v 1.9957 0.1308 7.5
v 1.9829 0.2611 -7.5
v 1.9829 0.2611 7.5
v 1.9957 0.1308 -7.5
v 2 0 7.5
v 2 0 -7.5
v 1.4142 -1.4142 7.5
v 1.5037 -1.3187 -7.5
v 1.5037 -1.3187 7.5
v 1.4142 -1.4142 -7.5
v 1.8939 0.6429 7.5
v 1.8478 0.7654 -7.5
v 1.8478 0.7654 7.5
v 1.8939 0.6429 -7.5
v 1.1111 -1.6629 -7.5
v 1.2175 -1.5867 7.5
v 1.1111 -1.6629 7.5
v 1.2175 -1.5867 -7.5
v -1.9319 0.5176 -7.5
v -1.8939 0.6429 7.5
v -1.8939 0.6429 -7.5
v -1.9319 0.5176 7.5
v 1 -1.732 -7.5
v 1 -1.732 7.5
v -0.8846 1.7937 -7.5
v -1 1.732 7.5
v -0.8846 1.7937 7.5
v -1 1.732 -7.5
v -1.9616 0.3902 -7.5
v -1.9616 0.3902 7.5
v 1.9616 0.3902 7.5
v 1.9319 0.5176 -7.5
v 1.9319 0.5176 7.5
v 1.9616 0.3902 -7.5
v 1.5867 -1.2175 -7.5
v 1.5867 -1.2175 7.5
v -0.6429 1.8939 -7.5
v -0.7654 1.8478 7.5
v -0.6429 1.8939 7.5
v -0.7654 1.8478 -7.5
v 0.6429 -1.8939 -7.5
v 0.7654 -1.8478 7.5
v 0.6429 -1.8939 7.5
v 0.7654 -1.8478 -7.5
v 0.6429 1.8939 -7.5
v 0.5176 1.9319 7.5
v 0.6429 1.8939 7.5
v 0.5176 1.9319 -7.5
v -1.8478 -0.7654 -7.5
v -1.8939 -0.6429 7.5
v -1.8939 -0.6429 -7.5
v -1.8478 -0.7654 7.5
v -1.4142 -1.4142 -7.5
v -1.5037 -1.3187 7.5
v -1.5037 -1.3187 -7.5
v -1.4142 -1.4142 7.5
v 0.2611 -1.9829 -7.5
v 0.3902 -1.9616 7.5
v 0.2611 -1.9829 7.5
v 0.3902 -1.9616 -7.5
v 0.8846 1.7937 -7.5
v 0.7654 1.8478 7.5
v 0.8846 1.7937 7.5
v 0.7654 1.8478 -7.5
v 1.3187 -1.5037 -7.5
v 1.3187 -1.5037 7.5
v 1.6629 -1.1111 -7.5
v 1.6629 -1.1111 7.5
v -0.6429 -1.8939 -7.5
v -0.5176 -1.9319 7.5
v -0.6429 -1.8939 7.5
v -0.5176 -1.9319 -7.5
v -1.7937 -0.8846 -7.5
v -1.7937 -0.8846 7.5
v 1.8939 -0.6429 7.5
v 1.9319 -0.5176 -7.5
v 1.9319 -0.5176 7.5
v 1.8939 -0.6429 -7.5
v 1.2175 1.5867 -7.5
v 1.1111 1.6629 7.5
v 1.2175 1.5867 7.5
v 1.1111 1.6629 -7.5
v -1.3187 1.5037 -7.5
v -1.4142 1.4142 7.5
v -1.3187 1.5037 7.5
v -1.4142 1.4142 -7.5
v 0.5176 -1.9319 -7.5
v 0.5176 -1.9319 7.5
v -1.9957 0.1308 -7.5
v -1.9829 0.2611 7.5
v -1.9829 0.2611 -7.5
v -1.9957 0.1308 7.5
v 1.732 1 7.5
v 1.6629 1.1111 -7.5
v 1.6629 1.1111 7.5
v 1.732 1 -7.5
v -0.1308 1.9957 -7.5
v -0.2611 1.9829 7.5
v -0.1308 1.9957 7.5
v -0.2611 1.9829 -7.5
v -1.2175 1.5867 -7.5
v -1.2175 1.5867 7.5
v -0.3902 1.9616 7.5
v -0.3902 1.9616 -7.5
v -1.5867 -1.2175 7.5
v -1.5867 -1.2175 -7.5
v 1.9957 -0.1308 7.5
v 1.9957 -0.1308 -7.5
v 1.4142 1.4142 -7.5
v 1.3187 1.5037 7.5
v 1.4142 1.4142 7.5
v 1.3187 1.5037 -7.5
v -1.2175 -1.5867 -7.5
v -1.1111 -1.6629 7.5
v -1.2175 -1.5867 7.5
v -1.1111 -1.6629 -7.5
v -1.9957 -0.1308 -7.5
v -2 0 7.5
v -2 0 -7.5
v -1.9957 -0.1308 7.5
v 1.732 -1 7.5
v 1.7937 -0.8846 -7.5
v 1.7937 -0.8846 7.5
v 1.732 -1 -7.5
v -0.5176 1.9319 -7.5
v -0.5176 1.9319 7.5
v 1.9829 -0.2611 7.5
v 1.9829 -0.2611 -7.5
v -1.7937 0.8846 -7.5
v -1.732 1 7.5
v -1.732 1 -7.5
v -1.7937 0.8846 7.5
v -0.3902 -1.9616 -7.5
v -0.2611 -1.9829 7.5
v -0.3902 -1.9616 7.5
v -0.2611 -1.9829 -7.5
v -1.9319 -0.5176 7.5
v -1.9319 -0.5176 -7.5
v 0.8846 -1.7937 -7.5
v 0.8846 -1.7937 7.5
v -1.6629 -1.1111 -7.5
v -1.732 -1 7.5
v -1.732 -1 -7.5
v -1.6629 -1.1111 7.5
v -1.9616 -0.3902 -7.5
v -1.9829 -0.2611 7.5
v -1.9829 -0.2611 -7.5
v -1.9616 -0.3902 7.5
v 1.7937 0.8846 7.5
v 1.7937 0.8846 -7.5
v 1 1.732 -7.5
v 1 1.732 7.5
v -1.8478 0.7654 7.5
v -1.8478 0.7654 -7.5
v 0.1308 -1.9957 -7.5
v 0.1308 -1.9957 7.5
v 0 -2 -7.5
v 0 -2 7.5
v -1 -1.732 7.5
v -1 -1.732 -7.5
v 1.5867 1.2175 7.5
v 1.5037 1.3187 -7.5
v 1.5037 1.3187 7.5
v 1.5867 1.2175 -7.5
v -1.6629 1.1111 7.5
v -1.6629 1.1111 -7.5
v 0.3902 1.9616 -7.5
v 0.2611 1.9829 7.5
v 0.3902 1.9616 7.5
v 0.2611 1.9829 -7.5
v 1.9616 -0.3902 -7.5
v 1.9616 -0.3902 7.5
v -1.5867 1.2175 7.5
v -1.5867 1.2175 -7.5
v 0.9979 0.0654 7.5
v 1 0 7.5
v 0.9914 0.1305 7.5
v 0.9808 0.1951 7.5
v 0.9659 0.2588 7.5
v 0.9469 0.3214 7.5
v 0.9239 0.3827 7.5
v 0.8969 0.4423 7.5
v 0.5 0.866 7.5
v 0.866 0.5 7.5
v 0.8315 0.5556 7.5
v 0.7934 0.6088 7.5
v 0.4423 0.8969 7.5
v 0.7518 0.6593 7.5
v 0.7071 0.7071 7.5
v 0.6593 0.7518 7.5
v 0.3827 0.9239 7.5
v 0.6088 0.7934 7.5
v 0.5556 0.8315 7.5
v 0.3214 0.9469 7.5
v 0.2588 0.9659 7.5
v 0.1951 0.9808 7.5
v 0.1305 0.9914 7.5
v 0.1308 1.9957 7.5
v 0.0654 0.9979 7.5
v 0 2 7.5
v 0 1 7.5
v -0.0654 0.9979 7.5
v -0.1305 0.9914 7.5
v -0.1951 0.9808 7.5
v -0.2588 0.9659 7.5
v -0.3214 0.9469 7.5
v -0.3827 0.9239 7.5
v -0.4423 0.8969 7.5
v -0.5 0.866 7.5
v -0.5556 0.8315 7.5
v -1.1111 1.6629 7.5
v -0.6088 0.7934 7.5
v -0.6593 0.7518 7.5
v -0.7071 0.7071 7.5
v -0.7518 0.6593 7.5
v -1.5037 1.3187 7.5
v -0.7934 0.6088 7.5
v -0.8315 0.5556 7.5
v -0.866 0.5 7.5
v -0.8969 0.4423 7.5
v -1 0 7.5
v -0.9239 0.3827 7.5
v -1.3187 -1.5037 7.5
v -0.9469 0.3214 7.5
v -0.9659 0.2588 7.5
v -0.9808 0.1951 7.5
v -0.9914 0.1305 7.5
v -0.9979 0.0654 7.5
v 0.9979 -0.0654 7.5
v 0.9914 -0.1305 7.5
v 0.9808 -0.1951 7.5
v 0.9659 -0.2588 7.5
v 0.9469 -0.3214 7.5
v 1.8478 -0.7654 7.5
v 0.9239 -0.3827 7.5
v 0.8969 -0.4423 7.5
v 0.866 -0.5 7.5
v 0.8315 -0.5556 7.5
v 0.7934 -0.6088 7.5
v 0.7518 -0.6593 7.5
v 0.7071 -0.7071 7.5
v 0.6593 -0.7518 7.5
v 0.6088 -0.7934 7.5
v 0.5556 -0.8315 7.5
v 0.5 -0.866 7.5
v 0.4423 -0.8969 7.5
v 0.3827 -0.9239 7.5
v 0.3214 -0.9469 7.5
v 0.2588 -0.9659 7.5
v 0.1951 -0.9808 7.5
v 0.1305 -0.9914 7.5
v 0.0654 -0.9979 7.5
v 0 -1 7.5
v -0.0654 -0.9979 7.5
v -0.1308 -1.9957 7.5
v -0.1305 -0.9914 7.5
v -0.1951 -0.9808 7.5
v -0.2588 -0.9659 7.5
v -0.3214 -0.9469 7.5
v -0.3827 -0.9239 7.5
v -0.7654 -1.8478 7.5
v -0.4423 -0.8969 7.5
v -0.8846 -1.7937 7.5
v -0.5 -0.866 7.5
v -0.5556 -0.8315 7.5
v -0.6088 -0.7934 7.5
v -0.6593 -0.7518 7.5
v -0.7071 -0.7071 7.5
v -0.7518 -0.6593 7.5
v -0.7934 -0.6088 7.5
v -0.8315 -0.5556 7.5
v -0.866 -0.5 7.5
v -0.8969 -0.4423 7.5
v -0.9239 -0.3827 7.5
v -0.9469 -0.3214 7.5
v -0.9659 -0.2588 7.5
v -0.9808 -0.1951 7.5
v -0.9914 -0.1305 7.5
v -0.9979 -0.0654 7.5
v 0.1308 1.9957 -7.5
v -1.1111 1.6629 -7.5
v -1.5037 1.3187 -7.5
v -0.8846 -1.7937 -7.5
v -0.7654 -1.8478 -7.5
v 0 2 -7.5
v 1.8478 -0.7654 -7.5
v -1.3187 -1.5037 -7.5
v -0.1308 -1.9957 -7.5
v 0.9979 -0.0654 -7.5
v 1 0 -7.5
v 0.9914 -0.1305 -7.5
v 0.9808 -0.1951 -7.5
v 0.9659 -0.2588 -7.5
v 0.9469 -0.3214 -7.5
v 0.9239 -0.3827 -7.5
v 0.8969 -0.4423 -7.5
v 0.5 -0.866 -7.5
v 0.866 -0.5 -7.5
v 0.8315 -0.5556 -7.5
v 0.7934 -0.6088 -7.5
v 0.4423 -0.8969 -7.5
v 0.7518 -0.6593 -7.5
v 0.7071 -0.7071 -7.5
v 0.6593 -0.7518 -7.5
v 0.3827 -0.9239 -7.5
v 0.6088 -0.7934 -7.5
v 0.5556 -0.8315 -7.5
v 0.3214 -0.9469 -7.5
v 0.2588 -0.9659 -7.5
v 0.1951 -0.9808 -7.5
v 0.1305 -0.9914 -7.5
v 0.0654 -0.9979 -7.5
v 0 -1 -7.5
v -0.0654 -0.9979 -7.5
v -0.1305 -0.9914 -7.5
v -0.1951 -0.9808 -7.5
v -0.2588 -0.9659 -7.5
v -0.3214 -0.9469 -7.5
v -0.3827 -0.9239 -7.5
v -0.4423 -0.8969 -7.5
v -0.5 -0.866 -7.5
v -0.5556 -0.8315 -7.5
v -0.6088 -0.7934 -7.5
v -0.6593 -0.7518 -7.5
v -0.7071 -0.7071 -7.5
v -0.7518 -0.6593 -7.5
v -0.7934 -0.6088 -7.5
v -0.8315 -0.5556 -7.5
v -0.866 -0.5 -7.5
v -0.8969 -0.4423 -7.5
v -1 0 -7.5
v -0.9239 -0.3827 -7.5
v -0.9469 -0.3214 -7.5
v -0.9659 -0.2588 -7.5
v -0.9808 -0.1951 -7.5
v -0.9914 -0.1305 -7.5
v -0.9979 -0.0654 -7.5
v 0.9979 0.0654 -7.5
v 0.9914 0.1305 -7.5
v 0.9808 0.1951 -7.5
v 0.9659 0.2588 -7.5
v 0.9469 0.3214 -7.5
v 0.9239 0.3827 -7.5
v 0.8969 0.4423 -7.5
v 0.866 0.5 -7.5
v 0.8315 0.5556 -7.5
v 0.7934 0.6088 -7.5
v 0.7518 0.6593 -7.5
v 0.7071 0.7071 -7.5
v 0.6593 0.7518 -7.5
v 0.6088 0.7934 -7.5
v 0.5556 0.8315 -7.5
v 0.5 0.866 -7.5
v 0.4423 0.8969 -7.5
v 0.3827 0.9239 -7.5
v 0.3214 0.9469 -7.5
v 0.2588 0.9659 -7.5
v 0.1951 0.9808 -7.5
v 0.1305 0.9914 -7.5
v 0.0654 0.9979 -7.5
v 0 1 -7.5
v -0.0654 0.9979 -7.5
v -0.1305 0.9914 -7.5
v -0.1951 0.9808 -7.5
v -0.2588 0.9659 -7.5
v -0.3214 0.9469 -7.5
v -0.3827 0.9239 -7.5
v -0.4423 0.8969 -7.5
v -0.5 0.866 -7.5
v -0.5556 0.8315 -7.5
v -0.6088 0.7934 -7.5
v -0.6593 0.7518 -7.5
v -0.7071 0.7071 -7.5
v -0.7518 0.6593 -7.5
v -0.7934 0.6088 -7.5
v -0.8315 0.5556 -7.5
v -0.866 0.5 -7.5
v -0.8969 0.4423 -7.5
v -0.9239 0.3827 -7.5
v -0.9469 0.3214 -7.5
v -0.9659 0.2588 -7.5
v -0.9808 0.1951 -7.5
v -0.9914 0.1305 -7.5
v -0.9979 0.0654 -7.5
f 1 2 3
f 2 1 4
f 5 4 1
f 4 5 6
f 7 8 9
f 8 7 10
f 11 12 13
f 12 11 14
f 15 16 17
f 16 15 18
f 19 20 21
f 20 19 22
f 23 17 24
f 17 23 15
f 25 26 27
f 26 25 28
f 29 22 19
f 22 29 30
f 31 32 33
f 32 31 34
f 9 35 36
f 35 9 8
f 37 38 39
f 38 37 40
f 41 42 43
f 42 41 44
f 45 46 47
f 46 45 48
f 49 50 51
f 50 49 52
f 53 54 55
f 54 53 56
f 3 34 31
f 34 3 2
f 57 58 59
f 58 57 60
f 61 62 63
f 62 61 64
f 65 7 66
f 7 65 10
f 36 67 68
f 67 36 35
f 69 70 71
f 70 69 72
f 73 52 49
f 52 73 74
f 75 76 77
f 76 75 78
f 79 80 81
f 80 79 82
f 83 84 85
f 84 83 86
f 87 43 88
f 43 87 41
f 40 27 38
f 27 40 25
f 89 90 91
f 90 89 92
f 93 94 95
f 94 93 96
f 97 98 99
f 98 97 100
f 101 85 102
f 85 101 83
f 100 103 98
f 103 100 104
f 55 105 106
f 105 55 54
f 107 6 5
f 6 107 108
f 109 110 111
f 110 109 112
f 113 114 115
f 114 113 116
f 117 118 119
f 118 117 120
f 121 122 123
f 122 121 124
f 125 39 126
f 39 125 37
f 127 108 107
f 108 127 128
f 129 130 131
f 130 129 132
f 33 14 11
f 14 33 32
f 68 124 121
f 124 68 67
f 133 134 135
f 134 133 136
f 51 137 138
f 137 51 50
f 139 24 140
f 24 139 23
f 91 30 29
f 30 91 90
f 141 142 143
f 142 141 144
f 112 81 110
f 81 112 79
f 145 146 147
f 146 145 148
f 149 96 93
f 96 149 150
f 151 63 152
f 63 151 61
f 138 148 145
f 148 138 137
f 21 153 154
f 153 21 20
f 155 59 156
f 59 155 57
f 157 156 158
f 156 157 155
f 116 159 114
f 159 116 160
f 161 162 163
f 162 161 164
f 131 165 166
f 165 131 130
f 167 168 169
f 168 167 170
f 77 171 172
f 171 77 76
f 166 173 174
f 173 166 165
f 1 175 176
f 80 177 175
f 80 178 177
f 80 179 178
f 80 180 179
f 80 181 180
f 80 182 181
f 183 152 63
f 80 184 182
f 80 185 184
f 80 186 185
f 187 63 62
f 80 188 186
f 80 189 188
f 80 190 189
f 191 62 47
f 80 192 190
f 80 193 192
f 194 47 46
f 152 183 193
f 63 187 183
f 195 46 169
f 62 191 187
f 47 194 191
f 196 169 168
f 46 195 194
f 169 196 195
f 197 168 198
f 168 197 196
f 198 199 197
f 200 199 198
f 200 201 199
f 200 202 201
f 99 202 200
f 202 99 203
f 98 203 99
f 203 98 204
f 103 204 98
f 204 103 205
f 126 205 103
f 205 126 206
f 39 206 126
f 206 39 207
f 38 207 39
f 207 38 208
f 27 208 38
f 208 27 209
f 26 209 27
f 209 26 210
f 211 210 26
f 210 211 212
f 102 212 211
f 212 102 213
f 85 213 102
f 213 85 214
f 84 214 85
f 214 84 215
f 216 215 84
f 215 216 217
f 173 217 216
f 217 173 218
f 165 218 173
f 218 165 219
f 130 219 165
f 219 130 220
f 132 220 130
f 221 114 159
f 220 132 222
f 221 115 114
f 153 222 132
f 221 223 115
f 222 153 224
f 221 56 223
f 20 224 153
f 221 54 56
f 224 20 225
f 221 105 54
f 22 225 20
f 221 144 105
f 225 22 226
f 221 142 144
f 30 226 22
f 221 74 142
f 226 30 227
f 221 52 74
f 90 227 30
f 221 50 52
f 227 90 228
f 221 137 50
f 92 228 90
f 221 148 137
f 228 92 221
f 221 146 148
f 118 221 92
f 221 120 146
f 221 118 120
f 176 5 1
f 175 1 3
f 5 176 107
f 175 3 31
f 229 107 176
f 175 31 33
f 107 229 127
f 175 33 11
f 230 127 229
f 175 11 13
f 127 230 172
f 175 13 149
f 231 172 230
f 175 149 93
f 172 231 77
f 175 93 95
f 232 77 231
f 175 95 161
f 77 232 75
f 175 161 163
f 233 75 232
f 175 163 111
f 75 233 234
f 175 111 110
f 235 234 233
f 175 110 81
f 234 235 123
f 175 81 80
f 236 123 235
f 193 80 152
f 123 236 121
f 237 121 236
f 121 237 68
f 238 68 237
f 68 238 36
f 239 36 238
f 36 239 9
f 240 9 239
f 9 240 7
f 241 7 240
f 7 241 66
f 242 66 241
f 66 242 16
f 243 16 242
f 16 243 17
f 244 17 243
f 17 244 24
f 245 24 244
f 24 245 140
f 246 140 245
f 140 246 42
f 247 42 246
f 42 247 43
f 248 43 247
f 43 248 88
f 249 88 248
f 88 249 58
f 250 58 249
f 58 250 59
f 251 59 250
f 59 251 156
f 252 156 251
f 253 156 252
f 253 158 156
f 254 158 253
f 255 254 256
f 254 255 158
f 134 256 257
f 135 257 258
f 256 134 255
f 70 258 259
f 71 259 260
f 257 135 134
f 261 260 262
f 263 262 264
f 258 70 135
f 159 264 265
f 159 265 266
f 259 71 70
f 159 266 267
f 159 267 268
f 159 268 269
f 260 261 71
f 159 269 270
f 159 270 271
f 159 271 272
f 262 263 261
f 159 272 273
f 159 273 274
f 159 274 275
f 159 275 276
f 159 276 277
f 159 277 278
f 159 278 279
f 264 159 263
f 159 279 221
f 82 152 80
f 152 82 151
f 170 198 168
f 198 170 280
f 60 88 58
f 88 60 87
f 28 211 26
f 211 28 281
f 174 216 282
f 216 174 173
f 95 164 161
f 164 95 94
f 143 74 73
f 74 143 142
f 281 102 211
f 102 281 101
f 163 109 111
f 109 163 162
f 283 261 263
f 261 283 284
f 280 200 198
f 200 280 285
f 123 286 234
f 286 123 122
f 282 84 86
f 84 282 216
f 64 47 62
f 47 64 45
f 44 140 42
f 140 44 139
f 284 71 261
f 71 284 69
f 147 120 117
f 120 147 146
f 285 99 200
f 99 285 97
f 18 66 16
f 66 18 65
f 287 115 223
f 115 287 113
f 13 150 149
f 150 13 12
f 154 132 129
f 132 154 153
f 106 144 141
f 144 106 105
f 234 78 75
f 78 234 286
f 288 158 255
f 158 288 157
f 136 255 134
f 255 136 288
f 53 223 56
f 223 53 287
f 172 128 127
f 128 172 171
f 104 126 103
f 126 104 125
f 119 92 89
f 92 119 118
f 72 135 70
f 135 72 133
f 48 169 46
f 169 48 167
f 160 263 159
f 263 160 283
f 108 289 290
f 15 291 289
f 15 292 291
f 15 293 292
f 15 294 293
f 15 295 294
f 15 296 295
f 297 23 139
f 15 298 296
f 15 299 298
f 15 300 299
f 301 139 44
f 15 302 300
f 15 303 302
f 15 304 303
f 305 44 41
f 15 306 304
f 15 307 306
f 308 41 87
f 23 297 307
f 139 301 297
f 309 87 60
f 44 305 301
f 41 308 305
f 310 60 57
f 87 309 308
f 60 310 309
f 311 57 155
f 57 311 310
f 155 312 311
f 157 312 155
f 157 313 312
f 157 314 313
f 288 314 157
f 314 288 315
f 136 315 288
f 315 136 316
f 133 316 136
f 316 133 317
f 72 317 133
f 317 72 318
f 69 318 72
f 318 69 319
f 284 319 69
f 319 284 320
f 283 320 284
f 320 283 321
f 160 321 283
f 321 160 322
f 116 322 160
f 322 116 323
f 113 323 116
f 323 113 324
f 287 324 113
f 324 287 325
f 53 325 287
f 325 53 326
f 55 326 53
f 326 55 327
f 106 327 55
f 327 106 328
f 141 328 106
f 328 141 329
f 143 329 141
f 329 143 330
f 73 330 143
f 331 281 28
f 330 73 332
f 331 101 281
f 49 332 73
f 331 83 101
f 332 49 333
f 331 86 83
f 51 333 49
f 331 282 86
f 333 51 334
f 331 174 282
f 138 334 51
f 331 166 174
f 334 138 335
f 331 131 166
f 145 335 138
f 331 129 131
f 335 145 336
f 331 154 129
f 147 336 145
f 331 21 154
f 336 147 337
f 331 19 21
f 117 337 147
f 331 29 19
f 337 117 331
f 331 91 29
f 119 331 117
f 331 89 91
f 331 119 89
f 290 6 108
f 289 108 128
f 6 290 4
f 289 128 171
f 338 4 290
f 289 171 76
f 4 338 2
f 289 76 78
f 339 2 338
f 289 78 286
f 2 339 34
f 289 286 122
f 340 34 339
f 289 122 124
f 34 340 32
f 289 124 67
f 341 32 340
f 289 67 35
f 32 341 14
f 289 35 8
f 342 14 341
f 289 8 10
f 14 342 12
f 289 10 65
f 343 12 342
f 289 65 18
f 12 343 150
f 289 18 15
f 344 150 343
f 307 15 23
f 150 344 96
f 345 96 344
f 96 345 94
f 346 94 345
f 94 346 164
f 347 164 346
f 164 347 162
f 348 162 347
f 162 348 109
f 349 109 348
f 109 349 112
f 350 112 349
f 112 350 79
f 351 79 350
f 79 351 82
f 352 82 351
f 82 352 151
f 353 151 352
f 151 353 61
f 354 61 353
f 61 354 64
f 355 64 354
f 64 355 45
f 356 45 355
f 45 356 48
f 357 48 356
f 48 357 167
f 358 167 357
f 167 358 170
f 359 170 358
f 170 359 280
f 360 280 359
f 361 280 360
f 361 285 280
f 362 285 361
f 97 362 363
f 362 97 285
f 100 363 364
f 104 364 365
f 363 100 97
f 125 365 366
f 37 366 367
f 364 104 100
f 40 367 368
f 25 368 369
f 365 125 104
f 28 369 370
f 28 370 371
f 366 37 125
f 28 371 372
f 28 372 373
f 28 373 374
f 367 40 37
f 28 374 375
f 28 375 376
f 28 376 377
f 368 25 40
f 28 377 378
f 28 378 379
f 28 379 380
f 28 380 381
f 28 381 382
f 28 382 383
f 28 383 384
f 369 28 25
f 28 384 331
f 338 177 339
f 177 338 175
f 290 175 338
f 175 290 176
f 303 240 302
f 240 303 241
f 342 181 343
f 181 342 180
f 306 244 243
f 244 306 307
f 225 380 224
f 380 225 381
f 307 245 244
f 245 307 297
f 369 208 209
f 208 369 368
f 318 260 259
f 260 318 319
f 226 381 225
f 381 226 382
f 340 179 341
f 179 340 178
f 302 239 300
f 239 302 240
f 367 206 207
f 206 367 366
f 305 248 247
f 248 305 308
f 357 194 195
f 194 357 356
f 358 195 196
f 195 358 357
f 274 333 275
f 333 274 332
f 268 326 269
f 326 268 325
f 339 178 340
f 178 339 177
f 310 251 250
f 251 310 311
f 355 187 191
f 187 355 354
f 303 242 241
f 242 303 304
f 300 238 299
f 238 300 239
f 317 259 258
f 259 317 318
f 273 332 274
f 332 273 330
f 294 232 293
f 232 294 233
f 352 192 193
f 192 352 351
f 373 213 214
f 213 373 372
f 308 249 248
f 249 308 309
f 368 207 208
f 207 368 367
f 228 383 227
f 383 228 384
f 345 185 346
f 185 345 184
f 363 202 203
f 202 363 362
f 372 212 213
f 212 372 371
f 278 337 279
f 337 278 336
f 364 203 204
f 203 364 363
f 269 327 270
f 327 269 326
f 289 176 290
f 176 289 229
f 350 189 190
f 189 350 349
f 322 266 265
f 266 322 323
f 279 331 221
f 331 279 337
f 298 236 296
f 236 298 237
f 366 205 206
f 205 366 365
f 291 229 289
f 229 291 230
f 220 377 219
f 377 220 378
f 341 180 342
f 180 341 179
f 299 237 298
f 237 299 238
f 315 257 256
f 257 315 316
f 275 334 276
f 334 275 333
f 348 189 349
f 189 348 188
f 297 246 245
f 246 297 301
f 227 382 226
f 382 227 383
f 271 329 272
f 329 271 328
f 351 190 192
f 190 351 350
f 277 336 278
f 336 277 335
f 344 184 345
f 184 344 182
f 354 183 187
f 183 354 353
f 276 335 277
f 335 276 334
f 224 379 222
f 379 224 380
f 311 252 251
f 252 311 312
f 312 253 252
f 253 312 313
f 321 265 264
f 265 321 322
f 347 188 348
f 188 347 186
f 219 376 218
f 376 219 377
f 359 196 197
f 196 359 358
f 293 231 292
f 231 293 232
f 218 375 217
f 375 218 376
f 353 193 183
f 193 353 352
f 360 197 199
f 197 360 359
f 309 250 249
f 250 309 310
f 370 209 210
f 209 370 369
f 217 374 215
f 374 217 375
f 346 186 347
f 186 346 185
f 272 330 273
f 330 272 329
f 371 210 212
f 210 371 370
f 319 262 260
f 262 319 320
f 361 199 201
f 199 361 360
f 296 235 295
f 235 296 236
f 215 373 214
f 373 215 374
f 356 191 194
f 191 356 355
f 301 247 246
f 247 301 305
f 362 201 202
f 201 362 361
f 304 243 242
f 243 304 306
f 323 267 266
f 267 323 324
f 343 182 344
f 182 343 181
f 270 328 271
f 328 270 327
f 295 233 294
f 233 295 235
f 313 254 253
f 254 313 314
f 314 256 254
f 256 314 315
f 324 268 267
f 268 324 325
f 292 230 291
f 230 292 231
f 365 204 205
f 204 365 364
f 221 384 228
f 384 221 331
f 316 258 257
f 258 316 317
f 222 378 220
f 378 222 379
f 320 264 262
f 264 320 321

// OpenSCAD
// Parameters
length = 15; //[7.5:30:0.5]
outer_diameter = 4; //[2:8:0.1]
inner_diameter = 2; //[1:6:0.1]
center = 1; //[0:1:1]
eps_overlap = 0.8; //[0.2:2:0.1]

// Smoothness (avoid faceted prism look)
$fn = 96;

// PTFE tubing (hollow cylinder)
module tubing(len, od, id, centered=true, eps=0.2) {
  // Ensure valid wall thickness
  id2 = min(id, od - 0.01);

  color([0.85, 0.85, 0.8])  // Off-white for PTFE
  difference() {
    cylinder(h=len, d=od, center=centered);
    cylinder(h=len + 2*eps, d=id2, center=centered);
  }
}

// Assembly (single connected solid)
module assembly() {
  tubing(length, outer_diameter, inner_diameter, centered=(center==1), eps=eps_overlap);
}

assembly();
